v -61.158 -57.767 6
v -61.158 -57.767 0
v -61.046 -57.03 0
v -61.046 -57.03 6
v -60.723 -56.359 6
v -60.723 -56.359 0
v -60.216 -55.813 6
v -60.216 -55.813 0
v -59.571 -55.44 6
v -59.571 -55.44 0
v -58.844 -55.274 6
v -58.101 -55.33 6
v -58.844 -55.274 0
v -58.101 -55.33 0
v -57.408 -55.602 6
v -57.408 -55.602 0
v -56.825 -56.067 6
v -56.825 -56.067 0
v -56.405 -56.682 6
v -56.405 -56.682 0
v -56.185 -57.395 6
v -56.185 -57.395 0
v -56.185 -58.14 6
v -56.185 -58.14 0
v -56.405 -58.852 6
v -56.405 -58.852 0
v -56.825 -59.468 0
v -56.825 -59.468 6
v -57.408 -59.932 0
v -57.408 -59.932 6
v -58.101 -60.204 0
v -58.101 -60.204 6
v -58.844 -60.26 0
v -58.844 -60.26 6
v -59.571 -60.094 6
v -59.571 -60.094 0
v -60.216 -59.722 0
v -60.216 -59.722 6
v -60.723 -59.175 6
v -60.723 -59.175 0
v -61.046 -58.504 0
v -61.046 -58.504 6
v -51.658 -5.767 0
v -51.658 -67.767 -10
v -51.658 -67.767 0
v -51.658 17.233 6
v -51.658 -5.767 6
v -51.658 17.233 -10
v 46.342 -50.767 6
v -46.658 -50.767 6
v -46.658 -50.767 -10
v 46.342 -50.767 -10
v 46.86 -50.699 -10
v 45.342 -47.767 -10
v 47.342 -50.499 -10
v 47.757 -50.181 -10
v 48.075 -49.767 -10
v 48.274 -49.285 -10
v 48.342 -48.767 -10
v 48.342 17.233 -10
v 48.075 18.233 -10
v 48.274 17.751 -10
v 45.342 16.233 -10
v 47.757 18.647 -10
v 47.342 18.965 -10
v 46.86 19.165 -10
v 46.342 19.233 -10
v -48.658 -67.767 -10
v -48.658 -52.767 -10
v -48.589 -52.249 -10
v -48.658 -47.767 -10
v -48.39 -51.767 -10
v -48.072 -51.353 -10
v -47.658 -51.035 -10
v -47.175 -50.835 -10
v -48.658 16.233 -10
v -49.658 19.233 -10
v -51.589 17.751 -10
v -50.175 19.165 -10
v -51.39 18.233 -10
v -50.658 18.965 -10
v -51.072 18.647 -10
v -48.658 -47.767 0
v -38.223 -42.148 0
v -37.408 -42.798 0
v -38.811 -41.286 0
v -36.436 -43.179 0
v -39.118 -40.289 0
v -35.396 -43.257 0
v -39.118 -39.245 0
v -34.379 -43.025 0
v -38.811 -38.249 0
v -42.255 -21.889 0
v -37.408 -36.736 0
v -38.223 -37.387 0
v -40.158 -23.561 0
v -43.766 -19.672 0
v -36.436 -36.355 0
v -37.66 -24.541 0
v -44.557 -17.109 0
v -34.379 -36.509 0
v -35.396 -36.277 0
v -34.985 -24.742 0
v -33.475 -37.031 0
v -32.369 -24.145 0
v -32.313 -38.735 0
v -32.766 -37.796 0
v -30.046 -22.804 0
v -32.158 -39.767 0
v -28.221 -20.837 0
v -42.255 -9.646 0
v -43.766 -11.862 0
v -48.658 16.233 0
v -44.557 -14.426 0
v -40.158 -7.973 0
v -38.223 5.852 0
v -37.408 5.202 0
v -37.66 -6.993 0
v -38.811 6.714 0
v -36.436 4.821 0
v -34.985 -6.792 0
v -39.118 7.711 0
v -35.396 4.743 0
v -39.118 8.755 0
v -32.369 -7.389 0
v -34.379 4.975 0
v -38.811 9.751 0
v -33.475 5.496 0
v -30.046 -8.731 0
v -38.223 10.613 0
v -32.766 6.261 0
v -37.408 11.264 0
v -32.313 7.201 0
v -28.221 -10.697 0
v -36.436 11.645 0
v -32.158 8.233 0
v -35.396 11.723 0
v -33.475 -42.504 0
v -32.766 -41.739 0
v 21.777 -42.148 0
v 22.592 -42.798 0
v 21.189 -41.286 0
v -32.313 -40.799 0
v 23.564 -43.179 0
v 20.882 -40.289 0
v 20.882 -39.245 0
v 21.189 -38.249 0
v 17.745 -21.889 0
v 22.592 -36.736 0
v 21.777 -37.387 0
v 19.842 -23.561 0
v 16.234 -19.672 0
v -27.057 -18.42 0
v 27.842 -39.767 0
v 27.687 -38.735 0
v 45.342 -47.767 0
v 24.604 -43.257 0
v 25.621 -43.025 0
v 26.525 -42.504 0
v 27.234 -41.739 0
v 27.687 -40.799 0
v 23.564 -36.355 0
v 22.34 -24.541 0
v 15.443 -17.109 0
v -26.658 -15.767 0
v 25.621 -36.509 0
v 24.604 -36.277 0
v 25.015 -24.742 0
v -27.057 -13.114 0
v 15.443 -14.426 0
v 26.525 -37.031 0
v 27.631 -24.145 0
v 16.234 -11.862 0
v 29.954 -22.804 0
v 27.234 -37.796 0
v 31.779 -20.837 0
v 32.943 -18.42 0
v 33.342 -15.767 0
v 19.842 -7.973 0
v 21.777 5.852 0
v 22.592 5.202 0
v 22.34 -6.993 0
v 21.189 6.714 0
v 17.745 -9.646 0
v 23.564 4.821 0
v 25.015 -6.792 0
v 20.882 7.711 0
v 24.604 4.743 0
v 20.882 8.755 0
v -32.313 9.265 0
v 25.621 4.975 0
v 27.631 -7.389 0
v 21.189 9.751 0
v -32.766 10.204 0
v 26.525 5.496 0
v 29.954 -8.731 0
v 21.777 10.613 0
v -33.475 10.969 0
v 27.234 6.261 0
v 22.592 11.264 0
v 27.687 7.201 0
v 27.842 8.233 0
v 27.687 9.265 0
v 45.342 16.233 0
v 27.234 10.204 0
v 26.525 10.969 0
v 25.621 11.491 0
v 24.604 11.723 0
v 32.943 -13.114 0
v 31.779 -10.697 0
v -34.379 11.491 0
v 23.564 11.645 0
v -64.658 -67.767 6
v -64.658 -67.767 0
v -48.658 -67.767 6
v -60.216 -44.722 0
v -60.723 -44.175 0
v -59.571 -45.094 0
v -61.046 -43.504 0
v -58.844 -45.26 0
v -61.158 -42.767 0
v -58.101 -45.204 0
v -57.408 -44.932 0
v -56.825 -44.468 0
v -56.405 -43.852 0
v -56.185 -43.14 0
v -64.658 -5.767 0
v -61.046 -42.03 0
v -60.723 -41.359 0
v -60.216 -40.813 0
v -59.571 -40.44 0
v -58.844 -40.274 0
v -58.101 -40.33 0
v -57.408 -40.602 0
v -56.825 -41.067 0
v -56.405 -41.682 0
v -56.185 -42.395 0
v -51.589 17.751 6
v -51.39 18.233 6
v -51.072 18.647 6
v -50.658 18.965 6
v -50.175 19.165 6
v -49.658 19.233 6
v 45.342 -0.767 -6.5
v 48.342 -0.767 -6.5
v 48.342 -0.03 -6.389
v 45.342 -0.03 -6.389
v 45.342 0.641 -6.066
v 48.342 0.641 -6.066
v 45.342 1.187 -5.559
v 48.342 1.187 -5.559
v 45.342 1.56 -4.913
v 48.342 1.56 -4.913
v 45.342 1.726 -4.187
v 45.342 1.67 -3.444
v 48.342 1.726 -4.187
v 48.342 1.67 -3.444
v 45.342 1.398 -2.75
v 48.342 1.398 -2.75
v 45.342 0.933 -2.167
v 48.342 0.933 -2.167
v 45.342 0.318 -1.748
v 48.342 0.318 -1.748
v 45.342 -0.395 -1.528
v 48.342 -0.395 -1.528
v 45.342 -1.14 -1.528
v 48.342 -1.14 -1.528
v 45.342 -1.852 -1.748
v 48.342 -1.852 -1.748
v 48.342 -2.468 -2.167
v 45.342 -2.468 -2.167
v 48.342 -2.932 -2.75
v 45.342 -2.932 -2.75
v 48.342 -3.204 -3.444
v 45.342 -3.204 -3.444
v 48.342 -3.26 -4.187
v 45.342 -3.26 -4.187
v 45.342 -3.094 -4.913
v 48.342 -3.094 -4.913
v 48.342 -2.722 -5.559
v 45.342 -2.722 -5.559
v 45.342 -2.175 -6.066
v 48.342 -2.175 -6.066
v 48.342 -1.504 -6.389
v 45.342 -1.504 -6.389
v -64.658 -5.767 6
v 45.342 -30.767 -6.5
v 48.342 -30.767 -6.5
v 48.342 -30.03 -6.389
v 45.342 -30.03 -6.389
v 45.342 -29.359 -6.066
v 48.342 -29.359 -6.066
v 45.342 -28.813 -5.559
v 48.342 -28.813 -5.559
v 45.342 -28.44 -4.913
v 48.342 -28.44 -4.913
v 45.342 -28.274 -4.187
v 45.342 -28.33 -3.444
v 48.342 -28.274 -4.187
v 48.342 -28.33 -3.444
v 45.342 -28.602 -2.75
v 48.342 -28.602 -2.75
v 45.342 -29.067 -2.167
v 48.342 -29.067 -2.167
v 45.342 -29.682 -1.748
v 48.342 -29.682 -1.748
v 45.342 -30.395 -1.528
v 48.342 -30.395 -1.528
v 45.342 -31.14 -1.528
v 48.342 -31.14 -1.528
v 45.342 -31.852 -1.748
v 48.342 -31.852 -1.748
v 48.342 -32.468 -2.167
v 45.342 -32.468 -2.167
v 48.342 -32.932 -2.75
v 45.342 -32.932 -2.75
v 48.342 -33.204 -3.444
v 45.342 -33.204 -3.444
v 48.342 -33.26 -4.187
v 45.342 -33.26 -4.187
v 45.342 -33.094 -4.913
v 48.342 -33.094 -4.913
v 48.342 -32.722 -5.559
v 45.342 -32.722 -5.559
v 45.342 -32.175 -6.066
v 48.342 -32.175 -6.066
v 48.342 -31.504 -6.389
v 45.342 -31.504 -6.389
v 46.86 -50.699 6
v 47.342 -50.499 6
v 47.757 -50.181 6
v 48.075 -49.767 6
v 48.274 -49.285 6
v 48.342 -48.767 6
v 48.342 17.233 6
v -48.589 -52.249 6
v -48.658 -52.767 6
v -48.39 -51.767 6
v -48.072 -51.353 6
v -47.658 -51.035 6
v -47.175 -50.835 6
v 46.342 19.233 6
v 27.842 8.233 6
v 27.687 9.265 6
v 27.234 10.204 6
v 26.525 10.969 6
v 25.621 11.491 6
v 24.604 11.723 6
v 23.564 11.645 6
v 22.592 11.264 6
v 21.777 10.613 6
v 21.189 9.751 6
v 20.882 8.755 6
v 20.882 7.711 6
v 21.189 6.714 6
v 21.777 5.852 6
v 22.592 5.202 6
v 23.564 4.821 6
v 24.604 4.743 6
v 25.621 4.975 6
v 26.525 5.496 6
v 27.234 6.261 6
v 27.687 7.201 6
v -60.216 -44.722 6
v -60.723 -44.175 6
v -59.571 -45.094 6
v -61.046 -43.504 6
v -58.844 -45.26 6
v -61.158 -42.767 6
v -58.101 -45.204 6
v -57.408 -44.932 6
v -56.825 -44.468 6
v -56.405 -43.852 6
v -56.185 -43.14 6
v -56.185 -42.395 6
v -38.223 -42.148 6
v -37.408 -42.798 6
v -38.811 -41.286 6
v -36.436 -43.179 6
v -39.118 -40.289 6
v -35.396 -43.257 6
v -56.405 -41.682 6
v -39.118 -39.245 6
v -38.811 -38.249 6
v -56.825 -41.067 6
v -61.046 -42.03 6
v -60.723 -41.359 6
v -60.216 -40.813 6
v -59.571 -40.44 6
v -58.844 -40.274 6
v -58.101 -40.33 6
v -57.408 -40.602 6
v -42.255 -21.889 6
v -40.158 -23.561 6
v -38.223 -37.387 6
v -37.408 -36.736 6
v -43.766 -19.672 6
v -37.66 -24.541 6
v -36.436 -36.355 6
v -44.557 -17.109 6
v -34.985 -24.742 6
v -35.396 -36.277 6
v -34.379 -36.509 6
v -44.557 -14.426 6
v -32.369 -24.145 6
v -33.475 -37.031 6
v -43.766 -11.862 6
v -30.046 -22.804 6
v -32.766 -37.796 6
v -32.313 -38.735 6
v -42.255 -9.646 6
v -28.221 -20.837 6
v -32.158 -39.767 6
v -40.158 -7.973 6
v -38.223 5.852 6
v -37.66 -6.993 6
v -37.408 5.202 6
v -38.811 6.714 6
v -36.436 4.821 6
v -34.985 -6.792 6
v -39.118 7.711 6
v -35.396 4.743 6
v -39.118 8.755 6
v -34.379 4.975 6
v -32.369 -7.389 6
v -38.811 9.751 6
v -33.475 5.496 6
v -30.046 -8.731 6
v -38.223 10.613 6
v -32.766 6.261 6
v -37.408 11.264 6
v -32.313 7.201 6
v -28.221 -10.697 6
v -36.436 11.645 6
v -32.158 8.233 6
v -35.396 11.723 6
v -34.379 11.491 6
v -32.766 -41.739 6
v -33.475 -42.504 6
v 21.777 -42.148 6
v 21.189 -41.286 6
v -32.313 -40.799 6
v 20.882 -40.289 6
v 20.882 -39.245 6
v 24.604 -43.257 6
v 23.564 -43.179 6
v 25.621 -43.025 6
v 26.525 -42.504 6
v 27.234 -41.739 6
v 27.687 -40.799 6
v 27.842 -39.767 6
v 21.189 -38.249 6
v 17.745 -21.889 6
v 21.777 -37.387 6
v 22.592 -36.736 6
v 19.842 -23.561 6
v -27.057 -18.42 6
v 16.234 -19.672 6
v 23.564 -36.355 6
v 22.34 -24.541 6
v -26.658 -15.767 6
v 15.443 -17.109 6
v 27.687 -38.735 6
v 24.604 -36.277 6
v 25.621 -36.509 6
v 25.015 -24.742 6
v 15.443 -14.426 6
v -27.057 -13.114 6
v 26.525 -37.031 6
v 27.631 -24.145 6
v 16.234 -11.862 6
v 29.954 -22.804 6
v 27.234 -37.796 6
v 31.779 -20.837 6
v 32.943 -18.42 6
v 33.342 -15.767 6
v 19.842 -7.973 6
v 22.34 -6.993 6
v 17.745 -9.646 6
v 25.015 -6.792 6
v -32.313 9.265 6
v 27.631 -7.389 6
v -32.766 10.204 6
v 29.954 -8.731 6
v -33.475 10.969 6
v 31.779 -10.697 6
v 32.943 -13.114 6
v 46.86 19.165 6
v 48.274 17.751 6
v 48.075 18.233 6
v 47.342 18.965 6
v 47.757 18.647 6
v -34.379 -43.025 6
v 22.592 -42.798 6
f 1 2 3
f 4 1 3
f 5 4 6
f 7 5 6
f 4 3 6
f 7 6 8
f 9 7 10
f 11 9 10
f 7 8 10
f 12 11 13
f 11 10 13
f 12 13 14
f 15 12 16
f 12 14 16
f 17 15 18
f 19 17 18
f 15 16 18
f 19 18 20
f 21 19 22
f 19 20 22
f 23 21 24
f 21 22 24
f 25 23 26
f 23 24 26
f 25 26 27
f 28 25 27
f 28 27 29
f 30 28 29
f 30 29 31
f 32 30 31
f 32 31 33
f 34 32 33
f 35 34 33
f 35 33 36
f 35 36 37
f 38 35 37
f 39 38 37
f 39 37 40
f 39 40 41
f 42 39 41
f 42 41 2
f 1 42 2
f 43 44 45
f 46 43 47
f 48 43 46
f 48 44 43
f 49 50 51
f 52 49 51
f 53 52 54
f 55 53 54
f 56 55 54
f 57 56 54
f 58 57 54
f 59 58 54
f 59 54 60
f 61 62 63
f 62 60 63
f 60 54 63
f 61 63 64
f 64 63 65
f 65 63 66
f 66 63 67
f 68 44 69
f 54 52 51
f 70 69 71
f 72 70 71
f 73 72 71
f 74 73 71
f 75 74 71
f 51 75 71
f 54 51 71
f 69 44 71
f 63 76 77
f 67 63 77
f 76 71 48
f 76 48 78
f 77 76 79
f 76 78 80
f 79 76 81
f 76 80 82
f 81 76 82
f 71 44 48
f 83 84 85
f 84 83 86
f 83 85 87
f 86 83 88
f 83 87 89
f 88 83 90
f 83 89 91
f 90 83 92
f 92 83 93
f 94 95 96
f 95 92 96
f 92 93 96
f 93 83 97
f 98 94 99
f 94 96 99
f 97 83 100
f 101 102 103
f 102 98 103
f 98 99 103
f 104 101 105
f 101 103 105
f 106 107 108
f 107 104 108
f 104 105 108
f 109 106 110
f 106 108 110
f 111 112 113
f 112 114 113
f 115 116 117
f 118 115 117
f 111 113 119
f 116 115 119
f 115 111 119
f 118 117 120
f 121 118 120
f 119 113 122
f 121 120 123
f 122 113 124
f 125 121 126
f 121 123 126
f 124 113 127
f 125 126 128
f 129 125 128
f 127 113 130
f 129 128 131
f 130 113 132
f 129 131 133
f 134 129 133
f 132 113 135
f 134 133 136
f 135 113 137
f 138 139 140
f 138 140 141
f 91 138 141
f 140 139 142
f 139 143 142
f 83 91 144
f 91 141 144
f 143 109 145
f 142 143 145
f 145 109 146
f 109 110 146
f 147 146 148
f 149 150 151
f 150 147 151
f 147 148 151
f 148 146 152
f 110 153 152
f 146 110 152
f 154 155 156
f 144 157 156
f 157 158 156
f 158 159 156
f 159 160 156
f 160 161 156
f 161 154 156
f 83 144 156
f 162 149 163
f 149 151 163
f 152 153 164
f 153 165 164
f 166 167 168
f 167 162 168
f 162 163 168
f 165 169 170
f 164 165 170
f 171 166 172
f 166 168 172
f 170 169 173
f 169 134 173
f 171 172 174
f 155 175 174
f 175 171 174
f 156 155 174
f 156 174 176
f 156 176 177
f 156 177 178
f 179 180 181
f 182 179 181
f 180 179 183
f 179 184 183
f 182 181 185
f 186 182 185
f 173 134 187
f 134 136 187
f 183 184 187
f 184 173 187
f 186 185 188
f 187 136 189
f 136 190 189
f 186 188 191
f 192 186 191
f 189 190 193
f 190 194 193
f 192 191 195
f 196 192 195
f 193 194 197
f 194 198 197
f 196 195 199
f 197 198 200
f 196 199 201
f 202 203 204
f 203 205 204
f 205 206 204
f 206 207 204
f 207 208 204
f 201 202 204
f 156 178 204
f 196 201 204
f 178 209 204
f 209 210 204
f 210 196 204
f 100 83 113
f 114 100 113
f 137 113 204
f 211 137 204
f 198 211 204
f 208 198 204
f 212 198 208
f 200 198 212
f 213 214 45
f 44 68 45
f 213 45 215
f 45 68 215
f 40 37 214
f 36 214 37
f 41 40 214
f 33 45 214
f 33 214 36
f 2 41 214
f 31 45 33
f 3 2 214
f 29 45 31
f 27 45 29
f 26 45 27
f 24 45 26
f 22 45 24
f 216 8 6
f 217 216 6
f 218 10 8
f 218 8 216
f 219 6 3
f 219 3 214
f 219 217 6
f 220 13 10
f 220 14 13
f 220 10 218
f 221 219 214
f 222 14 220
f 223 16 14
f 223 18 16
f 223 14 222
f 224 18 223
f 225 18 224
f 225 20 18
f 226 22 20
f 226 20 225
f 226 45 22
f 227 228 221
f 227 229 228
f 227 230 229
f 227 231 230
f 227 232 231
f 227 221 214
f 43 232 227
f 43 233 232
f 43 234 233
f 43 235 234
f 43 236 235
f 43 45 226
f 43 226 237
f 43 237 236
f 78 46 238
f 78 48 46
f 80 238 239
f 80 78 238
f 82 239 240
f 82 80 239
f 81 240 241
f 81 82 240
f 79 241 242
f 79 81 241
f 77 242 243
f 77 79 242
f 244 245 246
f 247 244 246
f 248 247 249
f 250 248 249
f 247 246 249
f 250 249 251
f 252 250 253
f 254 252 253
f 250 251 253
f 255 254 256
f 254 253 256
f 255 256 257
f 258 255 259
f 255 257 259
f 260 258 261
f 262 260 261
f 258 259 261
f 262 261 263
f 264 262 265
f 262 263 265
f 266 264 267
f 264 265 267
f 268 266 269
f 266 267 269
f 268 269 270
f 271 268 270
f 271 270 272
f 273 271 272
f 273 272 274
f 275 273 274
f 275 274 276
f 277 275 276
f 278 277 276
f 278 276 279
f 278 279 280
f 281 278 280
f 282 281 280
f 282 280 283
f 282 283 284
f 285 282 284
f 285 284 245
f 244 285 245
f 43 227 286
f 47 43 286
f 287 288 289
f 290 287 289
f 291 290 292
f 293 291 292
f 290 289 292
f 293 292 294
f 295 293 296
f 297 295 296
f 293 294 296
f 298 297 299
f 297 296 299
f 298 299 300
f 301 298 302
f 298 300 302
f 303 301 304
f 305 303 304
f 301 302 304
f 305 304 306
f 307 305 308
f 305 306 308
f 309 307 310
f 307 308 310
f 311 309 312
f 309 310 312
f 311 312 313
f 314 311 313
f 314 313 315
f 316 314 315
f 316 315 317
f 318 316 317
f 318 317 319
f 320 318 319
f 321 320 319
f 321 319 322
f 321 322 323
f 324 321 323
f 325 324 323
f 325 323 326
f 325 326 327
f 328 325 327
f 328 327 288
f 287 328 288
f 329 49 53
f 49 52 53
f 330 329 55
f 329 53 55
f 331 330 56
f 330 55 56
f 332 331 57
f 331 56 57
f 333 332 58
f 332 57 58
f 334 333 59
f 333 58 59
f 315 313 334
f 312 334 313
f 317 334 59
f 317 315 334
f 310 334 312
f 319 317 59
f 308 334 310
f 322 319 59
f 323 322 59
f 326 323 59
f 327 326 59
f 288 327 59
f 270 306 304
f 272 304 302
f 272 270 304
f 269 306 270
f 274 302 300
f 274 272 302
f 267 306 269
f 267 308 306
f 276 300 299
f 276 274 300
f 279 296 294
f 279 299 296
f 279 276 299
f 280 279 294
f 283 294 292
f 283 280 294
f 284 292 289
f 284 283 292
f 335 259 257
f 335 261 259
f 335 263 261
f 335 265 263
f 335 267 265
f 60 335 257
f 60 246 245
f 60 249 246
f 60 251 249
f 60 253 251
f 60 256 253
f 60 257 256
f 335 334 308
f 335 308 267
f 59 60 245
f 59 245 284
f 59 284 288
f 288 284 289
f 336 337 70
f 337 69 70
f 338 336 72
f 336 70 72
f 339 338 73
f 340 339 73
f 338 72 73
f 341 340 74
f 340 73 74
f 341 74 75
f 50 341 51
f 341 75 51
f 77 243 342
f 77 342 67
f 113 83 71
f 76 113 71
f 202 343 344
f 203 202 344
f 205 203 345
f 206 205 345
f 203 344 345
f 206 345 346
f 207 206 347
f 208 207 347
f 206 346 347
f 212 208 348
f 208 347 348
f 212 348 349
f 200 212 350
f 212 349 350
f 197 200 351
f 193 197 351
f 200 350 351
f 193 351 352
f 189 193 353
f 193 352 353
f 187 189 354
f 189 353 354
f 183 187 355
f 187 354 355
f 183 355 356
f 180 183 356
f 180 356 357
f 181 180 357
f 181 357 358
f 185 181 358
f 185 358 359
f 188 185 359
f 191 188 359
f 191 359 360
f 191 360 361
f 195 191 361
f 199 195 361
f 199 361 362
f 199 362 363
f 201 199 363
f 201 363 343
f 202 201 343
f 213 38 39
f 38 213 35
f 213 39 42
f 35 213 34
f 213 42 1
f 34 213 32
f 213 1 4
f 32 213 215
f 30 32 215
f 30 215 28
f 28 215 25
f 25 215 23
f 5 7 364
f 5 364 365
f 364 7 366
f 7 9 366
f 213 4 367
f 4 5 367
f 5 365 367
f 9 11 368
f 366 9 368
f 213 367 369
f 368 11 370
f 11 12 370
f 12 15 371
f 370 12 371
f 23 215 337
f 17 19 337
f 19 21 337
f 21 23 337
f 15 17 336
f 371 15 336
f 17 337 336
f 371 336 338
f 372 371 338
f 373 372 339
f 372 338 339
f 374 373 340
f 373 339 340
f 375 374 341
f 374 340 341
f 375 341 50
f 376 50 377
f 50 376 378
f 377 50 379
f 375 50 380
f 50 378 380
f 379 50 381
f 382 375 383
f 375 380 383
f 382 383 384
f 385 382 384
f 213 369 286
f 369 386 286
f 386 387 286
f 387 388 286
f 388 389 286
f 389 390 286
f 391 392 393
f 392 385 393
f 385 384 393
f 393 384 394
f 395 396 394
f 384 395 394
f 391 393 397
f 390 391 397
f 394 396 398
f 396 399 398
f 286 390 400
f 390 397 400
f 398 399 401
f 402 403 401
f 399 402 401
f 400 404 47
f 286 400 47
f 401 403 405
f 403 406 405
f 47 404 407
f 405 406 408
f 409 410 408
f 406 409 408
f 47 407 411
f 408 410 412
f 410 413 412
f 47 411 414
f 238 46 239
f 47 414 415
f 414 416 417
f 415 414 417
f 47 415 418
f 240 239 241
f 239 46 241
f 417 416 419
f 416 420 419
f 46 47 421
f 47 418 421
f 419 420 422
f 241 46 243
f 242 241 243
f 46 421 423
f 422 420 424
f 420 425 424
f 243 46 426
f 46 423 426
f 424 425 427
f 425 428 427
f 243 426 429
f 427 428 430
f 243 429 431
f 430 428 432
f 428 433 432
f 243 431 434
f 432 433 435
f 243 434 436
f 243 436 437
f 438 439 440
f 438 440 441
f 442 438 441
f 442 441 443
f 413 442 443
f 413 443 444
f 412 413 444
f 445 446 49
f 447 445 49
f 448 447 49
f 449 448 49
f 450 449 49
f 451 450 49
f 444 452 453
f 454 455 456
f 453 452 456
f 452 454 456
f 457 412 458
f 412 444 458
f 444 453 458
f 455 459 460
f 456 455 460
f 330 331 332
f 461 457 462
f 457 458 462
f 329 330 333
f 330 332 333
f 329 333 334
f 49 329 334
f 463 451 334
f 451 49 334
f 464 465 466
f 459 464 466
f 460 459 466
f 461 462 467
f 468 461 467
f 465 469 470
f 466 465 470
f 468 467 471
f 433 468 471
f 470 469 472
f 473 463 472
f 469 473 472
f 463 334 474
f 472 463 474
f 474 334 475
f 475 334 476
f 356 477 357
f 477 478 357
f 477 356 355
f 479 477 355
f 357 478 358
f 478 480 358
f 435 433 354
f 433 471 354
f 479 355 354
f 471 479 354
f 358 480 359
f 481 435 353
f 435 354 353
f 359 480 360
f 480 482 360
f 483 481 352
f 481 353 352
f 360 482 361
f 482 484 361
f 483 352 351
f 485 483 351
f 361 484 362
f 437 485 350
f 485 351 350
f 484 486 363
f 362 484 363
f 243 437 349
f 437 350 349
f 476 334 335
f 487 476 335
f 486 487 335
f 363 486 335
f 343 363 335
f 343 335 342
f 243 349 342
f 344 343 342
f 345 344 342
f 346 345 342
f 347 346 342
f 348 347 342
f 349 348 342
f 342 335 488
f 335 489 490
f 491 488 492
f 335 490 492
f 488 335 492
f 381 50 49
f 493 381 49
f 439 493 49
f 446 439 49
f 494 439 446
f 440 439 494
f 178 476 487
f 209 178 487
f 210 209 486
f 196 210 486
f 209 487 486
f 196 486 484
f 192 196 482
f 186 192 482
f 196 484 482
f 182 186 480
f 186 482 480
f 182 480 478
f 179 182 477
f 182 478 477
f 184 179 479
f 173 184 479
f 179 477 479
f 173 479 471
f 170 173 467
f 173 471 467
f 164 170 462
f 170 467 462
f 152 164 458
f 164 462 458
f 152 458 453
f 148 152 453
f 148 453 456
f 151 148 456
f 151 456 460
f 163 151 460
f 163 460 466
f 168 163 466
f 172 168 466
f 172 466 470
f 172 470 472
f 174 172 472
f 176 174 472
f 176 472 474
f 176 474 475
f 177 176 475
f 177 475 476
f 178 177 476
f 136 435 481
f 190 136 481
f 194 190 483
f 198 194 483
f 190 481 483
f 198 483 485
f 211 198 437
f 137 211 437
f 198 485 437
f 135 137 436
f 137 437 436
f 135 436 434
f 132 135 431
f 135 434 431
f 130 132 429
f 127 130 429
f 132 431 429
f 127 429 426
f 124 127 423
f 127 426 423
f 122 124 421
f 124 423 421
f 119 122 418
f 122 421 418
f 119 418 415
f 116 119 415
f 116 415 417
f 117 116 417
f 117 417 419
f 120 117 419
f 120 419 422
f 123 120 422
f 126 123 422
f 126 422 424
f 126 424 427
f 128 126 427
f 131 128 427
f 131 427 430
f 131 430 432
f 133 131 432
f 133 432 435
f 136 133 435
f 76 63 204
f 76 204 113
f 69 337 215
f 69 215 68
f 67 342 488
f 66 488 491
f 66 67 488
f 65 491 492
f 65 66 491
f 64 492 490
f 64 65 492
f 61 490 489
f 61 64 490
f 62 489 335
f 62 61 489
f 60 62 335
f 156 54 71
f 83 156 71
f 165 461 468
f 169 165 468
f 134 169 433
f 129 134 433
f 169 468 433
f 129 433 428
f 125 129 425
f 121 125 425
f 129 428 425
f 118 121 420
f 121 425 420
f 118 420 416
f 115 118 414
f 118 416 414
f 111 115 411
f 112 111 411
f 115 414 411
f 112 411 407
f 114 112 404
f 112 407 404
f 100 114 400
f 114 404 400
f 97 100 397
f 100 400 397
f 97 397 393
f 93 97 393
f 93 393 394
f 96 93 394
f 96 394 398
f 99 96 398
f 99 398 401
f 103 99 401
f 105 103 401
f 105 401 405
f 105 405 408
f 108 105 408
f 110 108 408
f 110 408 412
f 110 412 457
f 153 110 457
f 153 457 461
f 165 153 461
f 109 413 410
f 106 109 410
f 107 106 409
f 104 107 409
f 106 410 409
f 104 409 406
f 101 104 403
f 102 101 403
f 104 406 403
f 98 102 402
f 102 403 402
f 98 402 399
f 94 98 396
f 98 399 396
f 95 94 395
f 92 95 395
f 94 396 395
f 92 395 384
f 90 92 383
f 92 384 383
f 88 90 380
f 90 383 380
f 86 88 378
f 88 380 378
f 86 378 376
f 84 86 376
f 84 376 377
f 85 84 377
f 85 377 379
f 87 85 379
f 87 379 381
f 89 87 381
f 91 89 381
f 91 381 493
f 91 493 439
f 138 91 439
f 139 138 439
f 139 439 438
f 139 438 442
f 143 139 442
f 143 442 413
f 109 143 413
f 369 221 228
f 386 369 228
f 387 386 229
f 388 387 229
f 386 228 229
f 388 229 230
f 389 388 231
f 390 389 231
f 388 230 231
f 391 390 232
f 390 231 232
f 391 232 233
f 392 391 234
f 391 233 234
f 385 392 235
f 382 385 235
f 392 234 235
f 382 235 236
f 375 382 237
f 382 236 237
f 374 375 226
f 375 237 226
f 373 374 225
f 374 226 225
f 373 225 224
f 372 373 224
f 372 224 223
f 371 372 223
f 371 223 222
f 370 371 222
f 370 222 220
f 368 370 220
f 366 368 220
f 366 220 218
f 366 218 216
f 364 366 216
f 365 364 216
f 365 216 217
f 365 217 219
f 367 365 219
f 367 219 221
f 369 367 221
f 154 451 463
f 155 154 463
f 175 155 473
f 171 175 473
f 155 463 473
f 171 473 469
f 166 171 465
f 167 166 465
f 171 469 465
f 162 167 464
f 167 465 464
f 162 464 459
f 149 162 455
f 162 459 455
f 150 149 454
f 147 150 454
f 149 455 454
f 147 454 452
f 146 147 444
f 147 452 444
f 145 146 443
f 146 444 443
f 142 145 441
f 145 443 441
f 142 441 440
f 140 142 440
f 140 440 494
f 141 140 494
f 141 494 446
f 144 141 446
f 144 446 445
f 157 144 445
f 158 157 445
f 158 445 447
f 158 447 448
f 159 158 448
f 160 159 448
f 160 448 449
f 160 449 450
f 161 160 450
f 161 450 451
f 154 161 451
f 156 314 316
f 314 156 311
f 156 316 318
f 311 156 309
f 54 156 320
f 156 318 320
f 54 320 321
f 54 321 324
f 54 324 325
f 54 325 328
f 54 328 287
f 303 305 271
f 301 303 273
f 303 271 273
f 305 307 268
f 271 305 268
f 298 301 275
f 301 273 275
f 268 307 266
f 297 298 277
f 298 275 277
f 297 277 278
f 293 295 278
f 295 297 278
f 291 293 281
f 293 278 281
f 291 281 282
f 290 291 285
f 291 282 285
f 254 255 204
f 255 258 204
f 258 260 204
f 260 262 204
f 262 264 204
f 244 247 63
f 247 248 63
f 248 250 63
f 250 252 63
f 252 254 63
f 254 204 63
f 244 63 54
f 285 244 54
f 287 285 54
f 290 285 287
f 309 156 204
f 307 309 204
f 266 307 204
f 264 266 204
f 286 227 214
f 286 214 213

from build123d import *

# Parameters (mm, degrees)
SKETCH1_W           = 100
SKETCH1_H           = 64
BOSS_EXTRUDE1_DEPTH = 6
SKETCH2_R           = 9
SKETCH2_R_2         = 3.5
CUT_EXTRUDE1_DEPTH  = 10
LPATTERN1_COUNT     = 2
LPATTERN1_PITCH     = 60
BOSS_EXTRUDE2_DEPTH = 10
SKETCH4_W           = 6
SKETCH4_H           = 6
BOSS_EXTRUDE3_DEPTH = 20
SKETCH5_W           = 97
SKETCH5_H           = 16
BOSS_EXTRUDE4_DEPTH = 3
LPATTERN4_COUNT     = 2
LPATTERN4_PITCH     = 67
SKETCH6_W           = 16
SKETCH6_H           = 70
BOSS_EXTRUDE5_DEPTH = 3
SKETCH7_W           = 5.405235292
SKETCH7_H           = 22
CUT_EXTRUDE2_DEPTH  = 6
SKETCH8_W           = 6
SKETCH8_H           = 62
BOSS_EXTRUDE6_DEPTH = 10
SKETCH9_R           = 2.5
CUT_EXTRUDE3_DEPTH  = 10
LPATTERN5_COUNT     = 2
LPATTERN5_PITCH     = 15
FILLET1_R           = 2
SKETCH10_R          = 2.5
CUT_EXTRUDE4_DEPTH  = 10
LPATTERN6_COUNT     = 2
LPATTERN6_PITCH     = 30


with BuildPart() as part:
    # Sketch1 → Boss-Extrude1 (new body)
    with BuildSketch(Plane.XY):
        with Locations((-4.657534247, -15.767123288)):
            Rectangle(SKETCH1_W, SKETCH1_H)
    extrude(amount=BOSS_EXTRUDE1_DEPTH)

    # Sketch2 → Cut-Extrude1 (cut)
    with BuildSketch(Plane.XY.offset(6)):
        with Locations((-35.657534247, -15.767123288)):
            Circle(SKETCH2_R)
        with Locations((-35.657534247, 8.232876712)):
            Circle(SKETCH2_R_2)
        with Locations((-35.657534247, -39.767123288)):
            Circle(SKETCH2_R_2)
    cut_extrude1 = extrude(amount=-CUT_EXTRUDE1_DEPTH, mode=Mode.SUBTRACT)

    # LPattern1: Cut-Extrude1 ×2
    with Locations(*[(i * LPATTERN1_PITCH, 0, 0) for i in range(1, LPATTERN1_COUNT)]):
        add(cut_extrude1, mode=Mode.SUBTRACT)

    # Sketch3 → Boss-Extrude2 (add)
    with BuildSketch(Plane(origin=(0, 0, 0), x_dir=(-1, 0, 0), z_dir=(0, 0, -1))):
        Polygon((48.657534247, -47.767123288), (48.657534247, 16.232876712), (51.657534247, 16.232876712), (51.657534247, -47.767123288), (51.657534247, -67.767123288), (48.657534247, -67.767123288), align=None)
    extrude(amount=BOSS_EXTRUDE2_DEPTH)

    # Sketch4 → Boss-Extrude3 (add)
    with BuildSketch(Plane(origin=(0, -47.767123288, 0), x_dir=(-1, 0, 0), z_dir=(0, -1, 0))):
        with Locations((51.657534247, -3)):
            Rectangle(SKETCH4_W, SKETCH4_H)
    extrude(amount=BOSS_EXTRUDE3_DEPTH)

    # Sketch5 → Boss-Extrude4 (add)
    with BuildSketch(Plane(origin=(0, -47.767123288, 0), x_dir=(-1, 0, 0), z_dir=(0, -1, 0))):
        with Locations((3.157534247, 2)):
            Rectangle(SKETCH5_W, SKETCH5_H)
    boss_extrude4 = extrude(amount=BOSS_EXTRUDE4_DEPTH)

    # LPattern4: Boss-Extrude4 ×2
    with Locations(*[(0, i * LPATTERN4_PITCH, 0) for i in range(1, LPATTERN4_COUNT)]):
        add(boss_extrude4)

    # Sketch6 → Boss-Extrude5 (add)
    with BuildSketch(Plane(origin=(45.342465753, 0, 0), x_dir=(0, 0, -1), z_dir=(1, 0, 0))):
        with Locations((2, -15.767123288)):
            Rectangle(SKETCH6_W, SKETCH6_H)
    extrude(amount=BOSS_EXTRUDE5_DEPTH)

    # Sketch7 → Cut-Extrude2 (cut)
    with BuildSketch(Plane(origin=(0, 0, 0), x_dir=(-1, 0, 0), z_dir=(0, 0, -1))):
        with Locations((54.360151893, 5.232876712)):
            Rectangle(SKETCH7_W, SKETCH7_H)
    extrude(amount=-CUT_EXTRUDE2_DEPTH, mode=Mode.SUBTRACT)

    # Sketch8 → Boss-Extrude6 (add)
    with BuildSketch(Plane.ZY.offset(54.657534247)):
        with Locations((3, -36.767123288)):
            Rectangle(SKETCH8_W, SKETCH8_H)
    extrude(amount=BOSS_EXTRUDE6_DEPTH)

    # Sketch9 → Cut-Extrude3 (cut)
    with BuildSketch(Plane(origin=(0, 0, 0), x_dir=(-1, 0, 0), z_dir=(0, 0, -1))):
        with Locations((58.657534247, -57.767123288)):
            Circle(SKETCH9_R)
    cut_extrude3 = extrude(amount=-CUT_EXTRUDE3_DEPTH, mode=Mode.SUBTRACT)

    # LPattern5: Cut-Extrude3 ×2
    with Locations(*[(0, i * LPATTERN5_PITCH, 0) for i in range(1, LPATTERN5_COUNT)]):
        add(cut_extrude3, mode=Mode.SUBTRACT)

    # Fillet1
    fillet1_edges = [part.edges().sort_by_distance(p)[0] for p in [
        (-51.657534247, 19.232876712, -2),
        (48.342465753, -50.767123288, -2),
        (48.342465753, 19.232876712, -2),
        (-48.657534247, -50.767123288, -2),
    ]]
    fillet(fillet1_edges, radius=FILLET1_R)

    # Sketch10 → Cut-Extrude4 (cut)
    with BuildSketch(Plane(origin=(48.342465753, 0, 0), x_dir=(0, 0, -1), z_dir=(1, 0, 0))):
        with Locations((4, -0.767123288)):
            Circle(SKETCH10_R)
    cut_extrude4 = extrude(amount=-CUT_EXTRUDE4_DEPTH, mode=Mode.SUBTRACT)

    # LPattern6: Cut-Extrude4 ×2
    with Locations(*[(0, -i * LPATTERN6_PITCH, 0) for i in range(1, LPATTERN6_COUNT)]):
        add(cut_extrude4, mode=Mode.SUBTRACT)


solid = part.part
